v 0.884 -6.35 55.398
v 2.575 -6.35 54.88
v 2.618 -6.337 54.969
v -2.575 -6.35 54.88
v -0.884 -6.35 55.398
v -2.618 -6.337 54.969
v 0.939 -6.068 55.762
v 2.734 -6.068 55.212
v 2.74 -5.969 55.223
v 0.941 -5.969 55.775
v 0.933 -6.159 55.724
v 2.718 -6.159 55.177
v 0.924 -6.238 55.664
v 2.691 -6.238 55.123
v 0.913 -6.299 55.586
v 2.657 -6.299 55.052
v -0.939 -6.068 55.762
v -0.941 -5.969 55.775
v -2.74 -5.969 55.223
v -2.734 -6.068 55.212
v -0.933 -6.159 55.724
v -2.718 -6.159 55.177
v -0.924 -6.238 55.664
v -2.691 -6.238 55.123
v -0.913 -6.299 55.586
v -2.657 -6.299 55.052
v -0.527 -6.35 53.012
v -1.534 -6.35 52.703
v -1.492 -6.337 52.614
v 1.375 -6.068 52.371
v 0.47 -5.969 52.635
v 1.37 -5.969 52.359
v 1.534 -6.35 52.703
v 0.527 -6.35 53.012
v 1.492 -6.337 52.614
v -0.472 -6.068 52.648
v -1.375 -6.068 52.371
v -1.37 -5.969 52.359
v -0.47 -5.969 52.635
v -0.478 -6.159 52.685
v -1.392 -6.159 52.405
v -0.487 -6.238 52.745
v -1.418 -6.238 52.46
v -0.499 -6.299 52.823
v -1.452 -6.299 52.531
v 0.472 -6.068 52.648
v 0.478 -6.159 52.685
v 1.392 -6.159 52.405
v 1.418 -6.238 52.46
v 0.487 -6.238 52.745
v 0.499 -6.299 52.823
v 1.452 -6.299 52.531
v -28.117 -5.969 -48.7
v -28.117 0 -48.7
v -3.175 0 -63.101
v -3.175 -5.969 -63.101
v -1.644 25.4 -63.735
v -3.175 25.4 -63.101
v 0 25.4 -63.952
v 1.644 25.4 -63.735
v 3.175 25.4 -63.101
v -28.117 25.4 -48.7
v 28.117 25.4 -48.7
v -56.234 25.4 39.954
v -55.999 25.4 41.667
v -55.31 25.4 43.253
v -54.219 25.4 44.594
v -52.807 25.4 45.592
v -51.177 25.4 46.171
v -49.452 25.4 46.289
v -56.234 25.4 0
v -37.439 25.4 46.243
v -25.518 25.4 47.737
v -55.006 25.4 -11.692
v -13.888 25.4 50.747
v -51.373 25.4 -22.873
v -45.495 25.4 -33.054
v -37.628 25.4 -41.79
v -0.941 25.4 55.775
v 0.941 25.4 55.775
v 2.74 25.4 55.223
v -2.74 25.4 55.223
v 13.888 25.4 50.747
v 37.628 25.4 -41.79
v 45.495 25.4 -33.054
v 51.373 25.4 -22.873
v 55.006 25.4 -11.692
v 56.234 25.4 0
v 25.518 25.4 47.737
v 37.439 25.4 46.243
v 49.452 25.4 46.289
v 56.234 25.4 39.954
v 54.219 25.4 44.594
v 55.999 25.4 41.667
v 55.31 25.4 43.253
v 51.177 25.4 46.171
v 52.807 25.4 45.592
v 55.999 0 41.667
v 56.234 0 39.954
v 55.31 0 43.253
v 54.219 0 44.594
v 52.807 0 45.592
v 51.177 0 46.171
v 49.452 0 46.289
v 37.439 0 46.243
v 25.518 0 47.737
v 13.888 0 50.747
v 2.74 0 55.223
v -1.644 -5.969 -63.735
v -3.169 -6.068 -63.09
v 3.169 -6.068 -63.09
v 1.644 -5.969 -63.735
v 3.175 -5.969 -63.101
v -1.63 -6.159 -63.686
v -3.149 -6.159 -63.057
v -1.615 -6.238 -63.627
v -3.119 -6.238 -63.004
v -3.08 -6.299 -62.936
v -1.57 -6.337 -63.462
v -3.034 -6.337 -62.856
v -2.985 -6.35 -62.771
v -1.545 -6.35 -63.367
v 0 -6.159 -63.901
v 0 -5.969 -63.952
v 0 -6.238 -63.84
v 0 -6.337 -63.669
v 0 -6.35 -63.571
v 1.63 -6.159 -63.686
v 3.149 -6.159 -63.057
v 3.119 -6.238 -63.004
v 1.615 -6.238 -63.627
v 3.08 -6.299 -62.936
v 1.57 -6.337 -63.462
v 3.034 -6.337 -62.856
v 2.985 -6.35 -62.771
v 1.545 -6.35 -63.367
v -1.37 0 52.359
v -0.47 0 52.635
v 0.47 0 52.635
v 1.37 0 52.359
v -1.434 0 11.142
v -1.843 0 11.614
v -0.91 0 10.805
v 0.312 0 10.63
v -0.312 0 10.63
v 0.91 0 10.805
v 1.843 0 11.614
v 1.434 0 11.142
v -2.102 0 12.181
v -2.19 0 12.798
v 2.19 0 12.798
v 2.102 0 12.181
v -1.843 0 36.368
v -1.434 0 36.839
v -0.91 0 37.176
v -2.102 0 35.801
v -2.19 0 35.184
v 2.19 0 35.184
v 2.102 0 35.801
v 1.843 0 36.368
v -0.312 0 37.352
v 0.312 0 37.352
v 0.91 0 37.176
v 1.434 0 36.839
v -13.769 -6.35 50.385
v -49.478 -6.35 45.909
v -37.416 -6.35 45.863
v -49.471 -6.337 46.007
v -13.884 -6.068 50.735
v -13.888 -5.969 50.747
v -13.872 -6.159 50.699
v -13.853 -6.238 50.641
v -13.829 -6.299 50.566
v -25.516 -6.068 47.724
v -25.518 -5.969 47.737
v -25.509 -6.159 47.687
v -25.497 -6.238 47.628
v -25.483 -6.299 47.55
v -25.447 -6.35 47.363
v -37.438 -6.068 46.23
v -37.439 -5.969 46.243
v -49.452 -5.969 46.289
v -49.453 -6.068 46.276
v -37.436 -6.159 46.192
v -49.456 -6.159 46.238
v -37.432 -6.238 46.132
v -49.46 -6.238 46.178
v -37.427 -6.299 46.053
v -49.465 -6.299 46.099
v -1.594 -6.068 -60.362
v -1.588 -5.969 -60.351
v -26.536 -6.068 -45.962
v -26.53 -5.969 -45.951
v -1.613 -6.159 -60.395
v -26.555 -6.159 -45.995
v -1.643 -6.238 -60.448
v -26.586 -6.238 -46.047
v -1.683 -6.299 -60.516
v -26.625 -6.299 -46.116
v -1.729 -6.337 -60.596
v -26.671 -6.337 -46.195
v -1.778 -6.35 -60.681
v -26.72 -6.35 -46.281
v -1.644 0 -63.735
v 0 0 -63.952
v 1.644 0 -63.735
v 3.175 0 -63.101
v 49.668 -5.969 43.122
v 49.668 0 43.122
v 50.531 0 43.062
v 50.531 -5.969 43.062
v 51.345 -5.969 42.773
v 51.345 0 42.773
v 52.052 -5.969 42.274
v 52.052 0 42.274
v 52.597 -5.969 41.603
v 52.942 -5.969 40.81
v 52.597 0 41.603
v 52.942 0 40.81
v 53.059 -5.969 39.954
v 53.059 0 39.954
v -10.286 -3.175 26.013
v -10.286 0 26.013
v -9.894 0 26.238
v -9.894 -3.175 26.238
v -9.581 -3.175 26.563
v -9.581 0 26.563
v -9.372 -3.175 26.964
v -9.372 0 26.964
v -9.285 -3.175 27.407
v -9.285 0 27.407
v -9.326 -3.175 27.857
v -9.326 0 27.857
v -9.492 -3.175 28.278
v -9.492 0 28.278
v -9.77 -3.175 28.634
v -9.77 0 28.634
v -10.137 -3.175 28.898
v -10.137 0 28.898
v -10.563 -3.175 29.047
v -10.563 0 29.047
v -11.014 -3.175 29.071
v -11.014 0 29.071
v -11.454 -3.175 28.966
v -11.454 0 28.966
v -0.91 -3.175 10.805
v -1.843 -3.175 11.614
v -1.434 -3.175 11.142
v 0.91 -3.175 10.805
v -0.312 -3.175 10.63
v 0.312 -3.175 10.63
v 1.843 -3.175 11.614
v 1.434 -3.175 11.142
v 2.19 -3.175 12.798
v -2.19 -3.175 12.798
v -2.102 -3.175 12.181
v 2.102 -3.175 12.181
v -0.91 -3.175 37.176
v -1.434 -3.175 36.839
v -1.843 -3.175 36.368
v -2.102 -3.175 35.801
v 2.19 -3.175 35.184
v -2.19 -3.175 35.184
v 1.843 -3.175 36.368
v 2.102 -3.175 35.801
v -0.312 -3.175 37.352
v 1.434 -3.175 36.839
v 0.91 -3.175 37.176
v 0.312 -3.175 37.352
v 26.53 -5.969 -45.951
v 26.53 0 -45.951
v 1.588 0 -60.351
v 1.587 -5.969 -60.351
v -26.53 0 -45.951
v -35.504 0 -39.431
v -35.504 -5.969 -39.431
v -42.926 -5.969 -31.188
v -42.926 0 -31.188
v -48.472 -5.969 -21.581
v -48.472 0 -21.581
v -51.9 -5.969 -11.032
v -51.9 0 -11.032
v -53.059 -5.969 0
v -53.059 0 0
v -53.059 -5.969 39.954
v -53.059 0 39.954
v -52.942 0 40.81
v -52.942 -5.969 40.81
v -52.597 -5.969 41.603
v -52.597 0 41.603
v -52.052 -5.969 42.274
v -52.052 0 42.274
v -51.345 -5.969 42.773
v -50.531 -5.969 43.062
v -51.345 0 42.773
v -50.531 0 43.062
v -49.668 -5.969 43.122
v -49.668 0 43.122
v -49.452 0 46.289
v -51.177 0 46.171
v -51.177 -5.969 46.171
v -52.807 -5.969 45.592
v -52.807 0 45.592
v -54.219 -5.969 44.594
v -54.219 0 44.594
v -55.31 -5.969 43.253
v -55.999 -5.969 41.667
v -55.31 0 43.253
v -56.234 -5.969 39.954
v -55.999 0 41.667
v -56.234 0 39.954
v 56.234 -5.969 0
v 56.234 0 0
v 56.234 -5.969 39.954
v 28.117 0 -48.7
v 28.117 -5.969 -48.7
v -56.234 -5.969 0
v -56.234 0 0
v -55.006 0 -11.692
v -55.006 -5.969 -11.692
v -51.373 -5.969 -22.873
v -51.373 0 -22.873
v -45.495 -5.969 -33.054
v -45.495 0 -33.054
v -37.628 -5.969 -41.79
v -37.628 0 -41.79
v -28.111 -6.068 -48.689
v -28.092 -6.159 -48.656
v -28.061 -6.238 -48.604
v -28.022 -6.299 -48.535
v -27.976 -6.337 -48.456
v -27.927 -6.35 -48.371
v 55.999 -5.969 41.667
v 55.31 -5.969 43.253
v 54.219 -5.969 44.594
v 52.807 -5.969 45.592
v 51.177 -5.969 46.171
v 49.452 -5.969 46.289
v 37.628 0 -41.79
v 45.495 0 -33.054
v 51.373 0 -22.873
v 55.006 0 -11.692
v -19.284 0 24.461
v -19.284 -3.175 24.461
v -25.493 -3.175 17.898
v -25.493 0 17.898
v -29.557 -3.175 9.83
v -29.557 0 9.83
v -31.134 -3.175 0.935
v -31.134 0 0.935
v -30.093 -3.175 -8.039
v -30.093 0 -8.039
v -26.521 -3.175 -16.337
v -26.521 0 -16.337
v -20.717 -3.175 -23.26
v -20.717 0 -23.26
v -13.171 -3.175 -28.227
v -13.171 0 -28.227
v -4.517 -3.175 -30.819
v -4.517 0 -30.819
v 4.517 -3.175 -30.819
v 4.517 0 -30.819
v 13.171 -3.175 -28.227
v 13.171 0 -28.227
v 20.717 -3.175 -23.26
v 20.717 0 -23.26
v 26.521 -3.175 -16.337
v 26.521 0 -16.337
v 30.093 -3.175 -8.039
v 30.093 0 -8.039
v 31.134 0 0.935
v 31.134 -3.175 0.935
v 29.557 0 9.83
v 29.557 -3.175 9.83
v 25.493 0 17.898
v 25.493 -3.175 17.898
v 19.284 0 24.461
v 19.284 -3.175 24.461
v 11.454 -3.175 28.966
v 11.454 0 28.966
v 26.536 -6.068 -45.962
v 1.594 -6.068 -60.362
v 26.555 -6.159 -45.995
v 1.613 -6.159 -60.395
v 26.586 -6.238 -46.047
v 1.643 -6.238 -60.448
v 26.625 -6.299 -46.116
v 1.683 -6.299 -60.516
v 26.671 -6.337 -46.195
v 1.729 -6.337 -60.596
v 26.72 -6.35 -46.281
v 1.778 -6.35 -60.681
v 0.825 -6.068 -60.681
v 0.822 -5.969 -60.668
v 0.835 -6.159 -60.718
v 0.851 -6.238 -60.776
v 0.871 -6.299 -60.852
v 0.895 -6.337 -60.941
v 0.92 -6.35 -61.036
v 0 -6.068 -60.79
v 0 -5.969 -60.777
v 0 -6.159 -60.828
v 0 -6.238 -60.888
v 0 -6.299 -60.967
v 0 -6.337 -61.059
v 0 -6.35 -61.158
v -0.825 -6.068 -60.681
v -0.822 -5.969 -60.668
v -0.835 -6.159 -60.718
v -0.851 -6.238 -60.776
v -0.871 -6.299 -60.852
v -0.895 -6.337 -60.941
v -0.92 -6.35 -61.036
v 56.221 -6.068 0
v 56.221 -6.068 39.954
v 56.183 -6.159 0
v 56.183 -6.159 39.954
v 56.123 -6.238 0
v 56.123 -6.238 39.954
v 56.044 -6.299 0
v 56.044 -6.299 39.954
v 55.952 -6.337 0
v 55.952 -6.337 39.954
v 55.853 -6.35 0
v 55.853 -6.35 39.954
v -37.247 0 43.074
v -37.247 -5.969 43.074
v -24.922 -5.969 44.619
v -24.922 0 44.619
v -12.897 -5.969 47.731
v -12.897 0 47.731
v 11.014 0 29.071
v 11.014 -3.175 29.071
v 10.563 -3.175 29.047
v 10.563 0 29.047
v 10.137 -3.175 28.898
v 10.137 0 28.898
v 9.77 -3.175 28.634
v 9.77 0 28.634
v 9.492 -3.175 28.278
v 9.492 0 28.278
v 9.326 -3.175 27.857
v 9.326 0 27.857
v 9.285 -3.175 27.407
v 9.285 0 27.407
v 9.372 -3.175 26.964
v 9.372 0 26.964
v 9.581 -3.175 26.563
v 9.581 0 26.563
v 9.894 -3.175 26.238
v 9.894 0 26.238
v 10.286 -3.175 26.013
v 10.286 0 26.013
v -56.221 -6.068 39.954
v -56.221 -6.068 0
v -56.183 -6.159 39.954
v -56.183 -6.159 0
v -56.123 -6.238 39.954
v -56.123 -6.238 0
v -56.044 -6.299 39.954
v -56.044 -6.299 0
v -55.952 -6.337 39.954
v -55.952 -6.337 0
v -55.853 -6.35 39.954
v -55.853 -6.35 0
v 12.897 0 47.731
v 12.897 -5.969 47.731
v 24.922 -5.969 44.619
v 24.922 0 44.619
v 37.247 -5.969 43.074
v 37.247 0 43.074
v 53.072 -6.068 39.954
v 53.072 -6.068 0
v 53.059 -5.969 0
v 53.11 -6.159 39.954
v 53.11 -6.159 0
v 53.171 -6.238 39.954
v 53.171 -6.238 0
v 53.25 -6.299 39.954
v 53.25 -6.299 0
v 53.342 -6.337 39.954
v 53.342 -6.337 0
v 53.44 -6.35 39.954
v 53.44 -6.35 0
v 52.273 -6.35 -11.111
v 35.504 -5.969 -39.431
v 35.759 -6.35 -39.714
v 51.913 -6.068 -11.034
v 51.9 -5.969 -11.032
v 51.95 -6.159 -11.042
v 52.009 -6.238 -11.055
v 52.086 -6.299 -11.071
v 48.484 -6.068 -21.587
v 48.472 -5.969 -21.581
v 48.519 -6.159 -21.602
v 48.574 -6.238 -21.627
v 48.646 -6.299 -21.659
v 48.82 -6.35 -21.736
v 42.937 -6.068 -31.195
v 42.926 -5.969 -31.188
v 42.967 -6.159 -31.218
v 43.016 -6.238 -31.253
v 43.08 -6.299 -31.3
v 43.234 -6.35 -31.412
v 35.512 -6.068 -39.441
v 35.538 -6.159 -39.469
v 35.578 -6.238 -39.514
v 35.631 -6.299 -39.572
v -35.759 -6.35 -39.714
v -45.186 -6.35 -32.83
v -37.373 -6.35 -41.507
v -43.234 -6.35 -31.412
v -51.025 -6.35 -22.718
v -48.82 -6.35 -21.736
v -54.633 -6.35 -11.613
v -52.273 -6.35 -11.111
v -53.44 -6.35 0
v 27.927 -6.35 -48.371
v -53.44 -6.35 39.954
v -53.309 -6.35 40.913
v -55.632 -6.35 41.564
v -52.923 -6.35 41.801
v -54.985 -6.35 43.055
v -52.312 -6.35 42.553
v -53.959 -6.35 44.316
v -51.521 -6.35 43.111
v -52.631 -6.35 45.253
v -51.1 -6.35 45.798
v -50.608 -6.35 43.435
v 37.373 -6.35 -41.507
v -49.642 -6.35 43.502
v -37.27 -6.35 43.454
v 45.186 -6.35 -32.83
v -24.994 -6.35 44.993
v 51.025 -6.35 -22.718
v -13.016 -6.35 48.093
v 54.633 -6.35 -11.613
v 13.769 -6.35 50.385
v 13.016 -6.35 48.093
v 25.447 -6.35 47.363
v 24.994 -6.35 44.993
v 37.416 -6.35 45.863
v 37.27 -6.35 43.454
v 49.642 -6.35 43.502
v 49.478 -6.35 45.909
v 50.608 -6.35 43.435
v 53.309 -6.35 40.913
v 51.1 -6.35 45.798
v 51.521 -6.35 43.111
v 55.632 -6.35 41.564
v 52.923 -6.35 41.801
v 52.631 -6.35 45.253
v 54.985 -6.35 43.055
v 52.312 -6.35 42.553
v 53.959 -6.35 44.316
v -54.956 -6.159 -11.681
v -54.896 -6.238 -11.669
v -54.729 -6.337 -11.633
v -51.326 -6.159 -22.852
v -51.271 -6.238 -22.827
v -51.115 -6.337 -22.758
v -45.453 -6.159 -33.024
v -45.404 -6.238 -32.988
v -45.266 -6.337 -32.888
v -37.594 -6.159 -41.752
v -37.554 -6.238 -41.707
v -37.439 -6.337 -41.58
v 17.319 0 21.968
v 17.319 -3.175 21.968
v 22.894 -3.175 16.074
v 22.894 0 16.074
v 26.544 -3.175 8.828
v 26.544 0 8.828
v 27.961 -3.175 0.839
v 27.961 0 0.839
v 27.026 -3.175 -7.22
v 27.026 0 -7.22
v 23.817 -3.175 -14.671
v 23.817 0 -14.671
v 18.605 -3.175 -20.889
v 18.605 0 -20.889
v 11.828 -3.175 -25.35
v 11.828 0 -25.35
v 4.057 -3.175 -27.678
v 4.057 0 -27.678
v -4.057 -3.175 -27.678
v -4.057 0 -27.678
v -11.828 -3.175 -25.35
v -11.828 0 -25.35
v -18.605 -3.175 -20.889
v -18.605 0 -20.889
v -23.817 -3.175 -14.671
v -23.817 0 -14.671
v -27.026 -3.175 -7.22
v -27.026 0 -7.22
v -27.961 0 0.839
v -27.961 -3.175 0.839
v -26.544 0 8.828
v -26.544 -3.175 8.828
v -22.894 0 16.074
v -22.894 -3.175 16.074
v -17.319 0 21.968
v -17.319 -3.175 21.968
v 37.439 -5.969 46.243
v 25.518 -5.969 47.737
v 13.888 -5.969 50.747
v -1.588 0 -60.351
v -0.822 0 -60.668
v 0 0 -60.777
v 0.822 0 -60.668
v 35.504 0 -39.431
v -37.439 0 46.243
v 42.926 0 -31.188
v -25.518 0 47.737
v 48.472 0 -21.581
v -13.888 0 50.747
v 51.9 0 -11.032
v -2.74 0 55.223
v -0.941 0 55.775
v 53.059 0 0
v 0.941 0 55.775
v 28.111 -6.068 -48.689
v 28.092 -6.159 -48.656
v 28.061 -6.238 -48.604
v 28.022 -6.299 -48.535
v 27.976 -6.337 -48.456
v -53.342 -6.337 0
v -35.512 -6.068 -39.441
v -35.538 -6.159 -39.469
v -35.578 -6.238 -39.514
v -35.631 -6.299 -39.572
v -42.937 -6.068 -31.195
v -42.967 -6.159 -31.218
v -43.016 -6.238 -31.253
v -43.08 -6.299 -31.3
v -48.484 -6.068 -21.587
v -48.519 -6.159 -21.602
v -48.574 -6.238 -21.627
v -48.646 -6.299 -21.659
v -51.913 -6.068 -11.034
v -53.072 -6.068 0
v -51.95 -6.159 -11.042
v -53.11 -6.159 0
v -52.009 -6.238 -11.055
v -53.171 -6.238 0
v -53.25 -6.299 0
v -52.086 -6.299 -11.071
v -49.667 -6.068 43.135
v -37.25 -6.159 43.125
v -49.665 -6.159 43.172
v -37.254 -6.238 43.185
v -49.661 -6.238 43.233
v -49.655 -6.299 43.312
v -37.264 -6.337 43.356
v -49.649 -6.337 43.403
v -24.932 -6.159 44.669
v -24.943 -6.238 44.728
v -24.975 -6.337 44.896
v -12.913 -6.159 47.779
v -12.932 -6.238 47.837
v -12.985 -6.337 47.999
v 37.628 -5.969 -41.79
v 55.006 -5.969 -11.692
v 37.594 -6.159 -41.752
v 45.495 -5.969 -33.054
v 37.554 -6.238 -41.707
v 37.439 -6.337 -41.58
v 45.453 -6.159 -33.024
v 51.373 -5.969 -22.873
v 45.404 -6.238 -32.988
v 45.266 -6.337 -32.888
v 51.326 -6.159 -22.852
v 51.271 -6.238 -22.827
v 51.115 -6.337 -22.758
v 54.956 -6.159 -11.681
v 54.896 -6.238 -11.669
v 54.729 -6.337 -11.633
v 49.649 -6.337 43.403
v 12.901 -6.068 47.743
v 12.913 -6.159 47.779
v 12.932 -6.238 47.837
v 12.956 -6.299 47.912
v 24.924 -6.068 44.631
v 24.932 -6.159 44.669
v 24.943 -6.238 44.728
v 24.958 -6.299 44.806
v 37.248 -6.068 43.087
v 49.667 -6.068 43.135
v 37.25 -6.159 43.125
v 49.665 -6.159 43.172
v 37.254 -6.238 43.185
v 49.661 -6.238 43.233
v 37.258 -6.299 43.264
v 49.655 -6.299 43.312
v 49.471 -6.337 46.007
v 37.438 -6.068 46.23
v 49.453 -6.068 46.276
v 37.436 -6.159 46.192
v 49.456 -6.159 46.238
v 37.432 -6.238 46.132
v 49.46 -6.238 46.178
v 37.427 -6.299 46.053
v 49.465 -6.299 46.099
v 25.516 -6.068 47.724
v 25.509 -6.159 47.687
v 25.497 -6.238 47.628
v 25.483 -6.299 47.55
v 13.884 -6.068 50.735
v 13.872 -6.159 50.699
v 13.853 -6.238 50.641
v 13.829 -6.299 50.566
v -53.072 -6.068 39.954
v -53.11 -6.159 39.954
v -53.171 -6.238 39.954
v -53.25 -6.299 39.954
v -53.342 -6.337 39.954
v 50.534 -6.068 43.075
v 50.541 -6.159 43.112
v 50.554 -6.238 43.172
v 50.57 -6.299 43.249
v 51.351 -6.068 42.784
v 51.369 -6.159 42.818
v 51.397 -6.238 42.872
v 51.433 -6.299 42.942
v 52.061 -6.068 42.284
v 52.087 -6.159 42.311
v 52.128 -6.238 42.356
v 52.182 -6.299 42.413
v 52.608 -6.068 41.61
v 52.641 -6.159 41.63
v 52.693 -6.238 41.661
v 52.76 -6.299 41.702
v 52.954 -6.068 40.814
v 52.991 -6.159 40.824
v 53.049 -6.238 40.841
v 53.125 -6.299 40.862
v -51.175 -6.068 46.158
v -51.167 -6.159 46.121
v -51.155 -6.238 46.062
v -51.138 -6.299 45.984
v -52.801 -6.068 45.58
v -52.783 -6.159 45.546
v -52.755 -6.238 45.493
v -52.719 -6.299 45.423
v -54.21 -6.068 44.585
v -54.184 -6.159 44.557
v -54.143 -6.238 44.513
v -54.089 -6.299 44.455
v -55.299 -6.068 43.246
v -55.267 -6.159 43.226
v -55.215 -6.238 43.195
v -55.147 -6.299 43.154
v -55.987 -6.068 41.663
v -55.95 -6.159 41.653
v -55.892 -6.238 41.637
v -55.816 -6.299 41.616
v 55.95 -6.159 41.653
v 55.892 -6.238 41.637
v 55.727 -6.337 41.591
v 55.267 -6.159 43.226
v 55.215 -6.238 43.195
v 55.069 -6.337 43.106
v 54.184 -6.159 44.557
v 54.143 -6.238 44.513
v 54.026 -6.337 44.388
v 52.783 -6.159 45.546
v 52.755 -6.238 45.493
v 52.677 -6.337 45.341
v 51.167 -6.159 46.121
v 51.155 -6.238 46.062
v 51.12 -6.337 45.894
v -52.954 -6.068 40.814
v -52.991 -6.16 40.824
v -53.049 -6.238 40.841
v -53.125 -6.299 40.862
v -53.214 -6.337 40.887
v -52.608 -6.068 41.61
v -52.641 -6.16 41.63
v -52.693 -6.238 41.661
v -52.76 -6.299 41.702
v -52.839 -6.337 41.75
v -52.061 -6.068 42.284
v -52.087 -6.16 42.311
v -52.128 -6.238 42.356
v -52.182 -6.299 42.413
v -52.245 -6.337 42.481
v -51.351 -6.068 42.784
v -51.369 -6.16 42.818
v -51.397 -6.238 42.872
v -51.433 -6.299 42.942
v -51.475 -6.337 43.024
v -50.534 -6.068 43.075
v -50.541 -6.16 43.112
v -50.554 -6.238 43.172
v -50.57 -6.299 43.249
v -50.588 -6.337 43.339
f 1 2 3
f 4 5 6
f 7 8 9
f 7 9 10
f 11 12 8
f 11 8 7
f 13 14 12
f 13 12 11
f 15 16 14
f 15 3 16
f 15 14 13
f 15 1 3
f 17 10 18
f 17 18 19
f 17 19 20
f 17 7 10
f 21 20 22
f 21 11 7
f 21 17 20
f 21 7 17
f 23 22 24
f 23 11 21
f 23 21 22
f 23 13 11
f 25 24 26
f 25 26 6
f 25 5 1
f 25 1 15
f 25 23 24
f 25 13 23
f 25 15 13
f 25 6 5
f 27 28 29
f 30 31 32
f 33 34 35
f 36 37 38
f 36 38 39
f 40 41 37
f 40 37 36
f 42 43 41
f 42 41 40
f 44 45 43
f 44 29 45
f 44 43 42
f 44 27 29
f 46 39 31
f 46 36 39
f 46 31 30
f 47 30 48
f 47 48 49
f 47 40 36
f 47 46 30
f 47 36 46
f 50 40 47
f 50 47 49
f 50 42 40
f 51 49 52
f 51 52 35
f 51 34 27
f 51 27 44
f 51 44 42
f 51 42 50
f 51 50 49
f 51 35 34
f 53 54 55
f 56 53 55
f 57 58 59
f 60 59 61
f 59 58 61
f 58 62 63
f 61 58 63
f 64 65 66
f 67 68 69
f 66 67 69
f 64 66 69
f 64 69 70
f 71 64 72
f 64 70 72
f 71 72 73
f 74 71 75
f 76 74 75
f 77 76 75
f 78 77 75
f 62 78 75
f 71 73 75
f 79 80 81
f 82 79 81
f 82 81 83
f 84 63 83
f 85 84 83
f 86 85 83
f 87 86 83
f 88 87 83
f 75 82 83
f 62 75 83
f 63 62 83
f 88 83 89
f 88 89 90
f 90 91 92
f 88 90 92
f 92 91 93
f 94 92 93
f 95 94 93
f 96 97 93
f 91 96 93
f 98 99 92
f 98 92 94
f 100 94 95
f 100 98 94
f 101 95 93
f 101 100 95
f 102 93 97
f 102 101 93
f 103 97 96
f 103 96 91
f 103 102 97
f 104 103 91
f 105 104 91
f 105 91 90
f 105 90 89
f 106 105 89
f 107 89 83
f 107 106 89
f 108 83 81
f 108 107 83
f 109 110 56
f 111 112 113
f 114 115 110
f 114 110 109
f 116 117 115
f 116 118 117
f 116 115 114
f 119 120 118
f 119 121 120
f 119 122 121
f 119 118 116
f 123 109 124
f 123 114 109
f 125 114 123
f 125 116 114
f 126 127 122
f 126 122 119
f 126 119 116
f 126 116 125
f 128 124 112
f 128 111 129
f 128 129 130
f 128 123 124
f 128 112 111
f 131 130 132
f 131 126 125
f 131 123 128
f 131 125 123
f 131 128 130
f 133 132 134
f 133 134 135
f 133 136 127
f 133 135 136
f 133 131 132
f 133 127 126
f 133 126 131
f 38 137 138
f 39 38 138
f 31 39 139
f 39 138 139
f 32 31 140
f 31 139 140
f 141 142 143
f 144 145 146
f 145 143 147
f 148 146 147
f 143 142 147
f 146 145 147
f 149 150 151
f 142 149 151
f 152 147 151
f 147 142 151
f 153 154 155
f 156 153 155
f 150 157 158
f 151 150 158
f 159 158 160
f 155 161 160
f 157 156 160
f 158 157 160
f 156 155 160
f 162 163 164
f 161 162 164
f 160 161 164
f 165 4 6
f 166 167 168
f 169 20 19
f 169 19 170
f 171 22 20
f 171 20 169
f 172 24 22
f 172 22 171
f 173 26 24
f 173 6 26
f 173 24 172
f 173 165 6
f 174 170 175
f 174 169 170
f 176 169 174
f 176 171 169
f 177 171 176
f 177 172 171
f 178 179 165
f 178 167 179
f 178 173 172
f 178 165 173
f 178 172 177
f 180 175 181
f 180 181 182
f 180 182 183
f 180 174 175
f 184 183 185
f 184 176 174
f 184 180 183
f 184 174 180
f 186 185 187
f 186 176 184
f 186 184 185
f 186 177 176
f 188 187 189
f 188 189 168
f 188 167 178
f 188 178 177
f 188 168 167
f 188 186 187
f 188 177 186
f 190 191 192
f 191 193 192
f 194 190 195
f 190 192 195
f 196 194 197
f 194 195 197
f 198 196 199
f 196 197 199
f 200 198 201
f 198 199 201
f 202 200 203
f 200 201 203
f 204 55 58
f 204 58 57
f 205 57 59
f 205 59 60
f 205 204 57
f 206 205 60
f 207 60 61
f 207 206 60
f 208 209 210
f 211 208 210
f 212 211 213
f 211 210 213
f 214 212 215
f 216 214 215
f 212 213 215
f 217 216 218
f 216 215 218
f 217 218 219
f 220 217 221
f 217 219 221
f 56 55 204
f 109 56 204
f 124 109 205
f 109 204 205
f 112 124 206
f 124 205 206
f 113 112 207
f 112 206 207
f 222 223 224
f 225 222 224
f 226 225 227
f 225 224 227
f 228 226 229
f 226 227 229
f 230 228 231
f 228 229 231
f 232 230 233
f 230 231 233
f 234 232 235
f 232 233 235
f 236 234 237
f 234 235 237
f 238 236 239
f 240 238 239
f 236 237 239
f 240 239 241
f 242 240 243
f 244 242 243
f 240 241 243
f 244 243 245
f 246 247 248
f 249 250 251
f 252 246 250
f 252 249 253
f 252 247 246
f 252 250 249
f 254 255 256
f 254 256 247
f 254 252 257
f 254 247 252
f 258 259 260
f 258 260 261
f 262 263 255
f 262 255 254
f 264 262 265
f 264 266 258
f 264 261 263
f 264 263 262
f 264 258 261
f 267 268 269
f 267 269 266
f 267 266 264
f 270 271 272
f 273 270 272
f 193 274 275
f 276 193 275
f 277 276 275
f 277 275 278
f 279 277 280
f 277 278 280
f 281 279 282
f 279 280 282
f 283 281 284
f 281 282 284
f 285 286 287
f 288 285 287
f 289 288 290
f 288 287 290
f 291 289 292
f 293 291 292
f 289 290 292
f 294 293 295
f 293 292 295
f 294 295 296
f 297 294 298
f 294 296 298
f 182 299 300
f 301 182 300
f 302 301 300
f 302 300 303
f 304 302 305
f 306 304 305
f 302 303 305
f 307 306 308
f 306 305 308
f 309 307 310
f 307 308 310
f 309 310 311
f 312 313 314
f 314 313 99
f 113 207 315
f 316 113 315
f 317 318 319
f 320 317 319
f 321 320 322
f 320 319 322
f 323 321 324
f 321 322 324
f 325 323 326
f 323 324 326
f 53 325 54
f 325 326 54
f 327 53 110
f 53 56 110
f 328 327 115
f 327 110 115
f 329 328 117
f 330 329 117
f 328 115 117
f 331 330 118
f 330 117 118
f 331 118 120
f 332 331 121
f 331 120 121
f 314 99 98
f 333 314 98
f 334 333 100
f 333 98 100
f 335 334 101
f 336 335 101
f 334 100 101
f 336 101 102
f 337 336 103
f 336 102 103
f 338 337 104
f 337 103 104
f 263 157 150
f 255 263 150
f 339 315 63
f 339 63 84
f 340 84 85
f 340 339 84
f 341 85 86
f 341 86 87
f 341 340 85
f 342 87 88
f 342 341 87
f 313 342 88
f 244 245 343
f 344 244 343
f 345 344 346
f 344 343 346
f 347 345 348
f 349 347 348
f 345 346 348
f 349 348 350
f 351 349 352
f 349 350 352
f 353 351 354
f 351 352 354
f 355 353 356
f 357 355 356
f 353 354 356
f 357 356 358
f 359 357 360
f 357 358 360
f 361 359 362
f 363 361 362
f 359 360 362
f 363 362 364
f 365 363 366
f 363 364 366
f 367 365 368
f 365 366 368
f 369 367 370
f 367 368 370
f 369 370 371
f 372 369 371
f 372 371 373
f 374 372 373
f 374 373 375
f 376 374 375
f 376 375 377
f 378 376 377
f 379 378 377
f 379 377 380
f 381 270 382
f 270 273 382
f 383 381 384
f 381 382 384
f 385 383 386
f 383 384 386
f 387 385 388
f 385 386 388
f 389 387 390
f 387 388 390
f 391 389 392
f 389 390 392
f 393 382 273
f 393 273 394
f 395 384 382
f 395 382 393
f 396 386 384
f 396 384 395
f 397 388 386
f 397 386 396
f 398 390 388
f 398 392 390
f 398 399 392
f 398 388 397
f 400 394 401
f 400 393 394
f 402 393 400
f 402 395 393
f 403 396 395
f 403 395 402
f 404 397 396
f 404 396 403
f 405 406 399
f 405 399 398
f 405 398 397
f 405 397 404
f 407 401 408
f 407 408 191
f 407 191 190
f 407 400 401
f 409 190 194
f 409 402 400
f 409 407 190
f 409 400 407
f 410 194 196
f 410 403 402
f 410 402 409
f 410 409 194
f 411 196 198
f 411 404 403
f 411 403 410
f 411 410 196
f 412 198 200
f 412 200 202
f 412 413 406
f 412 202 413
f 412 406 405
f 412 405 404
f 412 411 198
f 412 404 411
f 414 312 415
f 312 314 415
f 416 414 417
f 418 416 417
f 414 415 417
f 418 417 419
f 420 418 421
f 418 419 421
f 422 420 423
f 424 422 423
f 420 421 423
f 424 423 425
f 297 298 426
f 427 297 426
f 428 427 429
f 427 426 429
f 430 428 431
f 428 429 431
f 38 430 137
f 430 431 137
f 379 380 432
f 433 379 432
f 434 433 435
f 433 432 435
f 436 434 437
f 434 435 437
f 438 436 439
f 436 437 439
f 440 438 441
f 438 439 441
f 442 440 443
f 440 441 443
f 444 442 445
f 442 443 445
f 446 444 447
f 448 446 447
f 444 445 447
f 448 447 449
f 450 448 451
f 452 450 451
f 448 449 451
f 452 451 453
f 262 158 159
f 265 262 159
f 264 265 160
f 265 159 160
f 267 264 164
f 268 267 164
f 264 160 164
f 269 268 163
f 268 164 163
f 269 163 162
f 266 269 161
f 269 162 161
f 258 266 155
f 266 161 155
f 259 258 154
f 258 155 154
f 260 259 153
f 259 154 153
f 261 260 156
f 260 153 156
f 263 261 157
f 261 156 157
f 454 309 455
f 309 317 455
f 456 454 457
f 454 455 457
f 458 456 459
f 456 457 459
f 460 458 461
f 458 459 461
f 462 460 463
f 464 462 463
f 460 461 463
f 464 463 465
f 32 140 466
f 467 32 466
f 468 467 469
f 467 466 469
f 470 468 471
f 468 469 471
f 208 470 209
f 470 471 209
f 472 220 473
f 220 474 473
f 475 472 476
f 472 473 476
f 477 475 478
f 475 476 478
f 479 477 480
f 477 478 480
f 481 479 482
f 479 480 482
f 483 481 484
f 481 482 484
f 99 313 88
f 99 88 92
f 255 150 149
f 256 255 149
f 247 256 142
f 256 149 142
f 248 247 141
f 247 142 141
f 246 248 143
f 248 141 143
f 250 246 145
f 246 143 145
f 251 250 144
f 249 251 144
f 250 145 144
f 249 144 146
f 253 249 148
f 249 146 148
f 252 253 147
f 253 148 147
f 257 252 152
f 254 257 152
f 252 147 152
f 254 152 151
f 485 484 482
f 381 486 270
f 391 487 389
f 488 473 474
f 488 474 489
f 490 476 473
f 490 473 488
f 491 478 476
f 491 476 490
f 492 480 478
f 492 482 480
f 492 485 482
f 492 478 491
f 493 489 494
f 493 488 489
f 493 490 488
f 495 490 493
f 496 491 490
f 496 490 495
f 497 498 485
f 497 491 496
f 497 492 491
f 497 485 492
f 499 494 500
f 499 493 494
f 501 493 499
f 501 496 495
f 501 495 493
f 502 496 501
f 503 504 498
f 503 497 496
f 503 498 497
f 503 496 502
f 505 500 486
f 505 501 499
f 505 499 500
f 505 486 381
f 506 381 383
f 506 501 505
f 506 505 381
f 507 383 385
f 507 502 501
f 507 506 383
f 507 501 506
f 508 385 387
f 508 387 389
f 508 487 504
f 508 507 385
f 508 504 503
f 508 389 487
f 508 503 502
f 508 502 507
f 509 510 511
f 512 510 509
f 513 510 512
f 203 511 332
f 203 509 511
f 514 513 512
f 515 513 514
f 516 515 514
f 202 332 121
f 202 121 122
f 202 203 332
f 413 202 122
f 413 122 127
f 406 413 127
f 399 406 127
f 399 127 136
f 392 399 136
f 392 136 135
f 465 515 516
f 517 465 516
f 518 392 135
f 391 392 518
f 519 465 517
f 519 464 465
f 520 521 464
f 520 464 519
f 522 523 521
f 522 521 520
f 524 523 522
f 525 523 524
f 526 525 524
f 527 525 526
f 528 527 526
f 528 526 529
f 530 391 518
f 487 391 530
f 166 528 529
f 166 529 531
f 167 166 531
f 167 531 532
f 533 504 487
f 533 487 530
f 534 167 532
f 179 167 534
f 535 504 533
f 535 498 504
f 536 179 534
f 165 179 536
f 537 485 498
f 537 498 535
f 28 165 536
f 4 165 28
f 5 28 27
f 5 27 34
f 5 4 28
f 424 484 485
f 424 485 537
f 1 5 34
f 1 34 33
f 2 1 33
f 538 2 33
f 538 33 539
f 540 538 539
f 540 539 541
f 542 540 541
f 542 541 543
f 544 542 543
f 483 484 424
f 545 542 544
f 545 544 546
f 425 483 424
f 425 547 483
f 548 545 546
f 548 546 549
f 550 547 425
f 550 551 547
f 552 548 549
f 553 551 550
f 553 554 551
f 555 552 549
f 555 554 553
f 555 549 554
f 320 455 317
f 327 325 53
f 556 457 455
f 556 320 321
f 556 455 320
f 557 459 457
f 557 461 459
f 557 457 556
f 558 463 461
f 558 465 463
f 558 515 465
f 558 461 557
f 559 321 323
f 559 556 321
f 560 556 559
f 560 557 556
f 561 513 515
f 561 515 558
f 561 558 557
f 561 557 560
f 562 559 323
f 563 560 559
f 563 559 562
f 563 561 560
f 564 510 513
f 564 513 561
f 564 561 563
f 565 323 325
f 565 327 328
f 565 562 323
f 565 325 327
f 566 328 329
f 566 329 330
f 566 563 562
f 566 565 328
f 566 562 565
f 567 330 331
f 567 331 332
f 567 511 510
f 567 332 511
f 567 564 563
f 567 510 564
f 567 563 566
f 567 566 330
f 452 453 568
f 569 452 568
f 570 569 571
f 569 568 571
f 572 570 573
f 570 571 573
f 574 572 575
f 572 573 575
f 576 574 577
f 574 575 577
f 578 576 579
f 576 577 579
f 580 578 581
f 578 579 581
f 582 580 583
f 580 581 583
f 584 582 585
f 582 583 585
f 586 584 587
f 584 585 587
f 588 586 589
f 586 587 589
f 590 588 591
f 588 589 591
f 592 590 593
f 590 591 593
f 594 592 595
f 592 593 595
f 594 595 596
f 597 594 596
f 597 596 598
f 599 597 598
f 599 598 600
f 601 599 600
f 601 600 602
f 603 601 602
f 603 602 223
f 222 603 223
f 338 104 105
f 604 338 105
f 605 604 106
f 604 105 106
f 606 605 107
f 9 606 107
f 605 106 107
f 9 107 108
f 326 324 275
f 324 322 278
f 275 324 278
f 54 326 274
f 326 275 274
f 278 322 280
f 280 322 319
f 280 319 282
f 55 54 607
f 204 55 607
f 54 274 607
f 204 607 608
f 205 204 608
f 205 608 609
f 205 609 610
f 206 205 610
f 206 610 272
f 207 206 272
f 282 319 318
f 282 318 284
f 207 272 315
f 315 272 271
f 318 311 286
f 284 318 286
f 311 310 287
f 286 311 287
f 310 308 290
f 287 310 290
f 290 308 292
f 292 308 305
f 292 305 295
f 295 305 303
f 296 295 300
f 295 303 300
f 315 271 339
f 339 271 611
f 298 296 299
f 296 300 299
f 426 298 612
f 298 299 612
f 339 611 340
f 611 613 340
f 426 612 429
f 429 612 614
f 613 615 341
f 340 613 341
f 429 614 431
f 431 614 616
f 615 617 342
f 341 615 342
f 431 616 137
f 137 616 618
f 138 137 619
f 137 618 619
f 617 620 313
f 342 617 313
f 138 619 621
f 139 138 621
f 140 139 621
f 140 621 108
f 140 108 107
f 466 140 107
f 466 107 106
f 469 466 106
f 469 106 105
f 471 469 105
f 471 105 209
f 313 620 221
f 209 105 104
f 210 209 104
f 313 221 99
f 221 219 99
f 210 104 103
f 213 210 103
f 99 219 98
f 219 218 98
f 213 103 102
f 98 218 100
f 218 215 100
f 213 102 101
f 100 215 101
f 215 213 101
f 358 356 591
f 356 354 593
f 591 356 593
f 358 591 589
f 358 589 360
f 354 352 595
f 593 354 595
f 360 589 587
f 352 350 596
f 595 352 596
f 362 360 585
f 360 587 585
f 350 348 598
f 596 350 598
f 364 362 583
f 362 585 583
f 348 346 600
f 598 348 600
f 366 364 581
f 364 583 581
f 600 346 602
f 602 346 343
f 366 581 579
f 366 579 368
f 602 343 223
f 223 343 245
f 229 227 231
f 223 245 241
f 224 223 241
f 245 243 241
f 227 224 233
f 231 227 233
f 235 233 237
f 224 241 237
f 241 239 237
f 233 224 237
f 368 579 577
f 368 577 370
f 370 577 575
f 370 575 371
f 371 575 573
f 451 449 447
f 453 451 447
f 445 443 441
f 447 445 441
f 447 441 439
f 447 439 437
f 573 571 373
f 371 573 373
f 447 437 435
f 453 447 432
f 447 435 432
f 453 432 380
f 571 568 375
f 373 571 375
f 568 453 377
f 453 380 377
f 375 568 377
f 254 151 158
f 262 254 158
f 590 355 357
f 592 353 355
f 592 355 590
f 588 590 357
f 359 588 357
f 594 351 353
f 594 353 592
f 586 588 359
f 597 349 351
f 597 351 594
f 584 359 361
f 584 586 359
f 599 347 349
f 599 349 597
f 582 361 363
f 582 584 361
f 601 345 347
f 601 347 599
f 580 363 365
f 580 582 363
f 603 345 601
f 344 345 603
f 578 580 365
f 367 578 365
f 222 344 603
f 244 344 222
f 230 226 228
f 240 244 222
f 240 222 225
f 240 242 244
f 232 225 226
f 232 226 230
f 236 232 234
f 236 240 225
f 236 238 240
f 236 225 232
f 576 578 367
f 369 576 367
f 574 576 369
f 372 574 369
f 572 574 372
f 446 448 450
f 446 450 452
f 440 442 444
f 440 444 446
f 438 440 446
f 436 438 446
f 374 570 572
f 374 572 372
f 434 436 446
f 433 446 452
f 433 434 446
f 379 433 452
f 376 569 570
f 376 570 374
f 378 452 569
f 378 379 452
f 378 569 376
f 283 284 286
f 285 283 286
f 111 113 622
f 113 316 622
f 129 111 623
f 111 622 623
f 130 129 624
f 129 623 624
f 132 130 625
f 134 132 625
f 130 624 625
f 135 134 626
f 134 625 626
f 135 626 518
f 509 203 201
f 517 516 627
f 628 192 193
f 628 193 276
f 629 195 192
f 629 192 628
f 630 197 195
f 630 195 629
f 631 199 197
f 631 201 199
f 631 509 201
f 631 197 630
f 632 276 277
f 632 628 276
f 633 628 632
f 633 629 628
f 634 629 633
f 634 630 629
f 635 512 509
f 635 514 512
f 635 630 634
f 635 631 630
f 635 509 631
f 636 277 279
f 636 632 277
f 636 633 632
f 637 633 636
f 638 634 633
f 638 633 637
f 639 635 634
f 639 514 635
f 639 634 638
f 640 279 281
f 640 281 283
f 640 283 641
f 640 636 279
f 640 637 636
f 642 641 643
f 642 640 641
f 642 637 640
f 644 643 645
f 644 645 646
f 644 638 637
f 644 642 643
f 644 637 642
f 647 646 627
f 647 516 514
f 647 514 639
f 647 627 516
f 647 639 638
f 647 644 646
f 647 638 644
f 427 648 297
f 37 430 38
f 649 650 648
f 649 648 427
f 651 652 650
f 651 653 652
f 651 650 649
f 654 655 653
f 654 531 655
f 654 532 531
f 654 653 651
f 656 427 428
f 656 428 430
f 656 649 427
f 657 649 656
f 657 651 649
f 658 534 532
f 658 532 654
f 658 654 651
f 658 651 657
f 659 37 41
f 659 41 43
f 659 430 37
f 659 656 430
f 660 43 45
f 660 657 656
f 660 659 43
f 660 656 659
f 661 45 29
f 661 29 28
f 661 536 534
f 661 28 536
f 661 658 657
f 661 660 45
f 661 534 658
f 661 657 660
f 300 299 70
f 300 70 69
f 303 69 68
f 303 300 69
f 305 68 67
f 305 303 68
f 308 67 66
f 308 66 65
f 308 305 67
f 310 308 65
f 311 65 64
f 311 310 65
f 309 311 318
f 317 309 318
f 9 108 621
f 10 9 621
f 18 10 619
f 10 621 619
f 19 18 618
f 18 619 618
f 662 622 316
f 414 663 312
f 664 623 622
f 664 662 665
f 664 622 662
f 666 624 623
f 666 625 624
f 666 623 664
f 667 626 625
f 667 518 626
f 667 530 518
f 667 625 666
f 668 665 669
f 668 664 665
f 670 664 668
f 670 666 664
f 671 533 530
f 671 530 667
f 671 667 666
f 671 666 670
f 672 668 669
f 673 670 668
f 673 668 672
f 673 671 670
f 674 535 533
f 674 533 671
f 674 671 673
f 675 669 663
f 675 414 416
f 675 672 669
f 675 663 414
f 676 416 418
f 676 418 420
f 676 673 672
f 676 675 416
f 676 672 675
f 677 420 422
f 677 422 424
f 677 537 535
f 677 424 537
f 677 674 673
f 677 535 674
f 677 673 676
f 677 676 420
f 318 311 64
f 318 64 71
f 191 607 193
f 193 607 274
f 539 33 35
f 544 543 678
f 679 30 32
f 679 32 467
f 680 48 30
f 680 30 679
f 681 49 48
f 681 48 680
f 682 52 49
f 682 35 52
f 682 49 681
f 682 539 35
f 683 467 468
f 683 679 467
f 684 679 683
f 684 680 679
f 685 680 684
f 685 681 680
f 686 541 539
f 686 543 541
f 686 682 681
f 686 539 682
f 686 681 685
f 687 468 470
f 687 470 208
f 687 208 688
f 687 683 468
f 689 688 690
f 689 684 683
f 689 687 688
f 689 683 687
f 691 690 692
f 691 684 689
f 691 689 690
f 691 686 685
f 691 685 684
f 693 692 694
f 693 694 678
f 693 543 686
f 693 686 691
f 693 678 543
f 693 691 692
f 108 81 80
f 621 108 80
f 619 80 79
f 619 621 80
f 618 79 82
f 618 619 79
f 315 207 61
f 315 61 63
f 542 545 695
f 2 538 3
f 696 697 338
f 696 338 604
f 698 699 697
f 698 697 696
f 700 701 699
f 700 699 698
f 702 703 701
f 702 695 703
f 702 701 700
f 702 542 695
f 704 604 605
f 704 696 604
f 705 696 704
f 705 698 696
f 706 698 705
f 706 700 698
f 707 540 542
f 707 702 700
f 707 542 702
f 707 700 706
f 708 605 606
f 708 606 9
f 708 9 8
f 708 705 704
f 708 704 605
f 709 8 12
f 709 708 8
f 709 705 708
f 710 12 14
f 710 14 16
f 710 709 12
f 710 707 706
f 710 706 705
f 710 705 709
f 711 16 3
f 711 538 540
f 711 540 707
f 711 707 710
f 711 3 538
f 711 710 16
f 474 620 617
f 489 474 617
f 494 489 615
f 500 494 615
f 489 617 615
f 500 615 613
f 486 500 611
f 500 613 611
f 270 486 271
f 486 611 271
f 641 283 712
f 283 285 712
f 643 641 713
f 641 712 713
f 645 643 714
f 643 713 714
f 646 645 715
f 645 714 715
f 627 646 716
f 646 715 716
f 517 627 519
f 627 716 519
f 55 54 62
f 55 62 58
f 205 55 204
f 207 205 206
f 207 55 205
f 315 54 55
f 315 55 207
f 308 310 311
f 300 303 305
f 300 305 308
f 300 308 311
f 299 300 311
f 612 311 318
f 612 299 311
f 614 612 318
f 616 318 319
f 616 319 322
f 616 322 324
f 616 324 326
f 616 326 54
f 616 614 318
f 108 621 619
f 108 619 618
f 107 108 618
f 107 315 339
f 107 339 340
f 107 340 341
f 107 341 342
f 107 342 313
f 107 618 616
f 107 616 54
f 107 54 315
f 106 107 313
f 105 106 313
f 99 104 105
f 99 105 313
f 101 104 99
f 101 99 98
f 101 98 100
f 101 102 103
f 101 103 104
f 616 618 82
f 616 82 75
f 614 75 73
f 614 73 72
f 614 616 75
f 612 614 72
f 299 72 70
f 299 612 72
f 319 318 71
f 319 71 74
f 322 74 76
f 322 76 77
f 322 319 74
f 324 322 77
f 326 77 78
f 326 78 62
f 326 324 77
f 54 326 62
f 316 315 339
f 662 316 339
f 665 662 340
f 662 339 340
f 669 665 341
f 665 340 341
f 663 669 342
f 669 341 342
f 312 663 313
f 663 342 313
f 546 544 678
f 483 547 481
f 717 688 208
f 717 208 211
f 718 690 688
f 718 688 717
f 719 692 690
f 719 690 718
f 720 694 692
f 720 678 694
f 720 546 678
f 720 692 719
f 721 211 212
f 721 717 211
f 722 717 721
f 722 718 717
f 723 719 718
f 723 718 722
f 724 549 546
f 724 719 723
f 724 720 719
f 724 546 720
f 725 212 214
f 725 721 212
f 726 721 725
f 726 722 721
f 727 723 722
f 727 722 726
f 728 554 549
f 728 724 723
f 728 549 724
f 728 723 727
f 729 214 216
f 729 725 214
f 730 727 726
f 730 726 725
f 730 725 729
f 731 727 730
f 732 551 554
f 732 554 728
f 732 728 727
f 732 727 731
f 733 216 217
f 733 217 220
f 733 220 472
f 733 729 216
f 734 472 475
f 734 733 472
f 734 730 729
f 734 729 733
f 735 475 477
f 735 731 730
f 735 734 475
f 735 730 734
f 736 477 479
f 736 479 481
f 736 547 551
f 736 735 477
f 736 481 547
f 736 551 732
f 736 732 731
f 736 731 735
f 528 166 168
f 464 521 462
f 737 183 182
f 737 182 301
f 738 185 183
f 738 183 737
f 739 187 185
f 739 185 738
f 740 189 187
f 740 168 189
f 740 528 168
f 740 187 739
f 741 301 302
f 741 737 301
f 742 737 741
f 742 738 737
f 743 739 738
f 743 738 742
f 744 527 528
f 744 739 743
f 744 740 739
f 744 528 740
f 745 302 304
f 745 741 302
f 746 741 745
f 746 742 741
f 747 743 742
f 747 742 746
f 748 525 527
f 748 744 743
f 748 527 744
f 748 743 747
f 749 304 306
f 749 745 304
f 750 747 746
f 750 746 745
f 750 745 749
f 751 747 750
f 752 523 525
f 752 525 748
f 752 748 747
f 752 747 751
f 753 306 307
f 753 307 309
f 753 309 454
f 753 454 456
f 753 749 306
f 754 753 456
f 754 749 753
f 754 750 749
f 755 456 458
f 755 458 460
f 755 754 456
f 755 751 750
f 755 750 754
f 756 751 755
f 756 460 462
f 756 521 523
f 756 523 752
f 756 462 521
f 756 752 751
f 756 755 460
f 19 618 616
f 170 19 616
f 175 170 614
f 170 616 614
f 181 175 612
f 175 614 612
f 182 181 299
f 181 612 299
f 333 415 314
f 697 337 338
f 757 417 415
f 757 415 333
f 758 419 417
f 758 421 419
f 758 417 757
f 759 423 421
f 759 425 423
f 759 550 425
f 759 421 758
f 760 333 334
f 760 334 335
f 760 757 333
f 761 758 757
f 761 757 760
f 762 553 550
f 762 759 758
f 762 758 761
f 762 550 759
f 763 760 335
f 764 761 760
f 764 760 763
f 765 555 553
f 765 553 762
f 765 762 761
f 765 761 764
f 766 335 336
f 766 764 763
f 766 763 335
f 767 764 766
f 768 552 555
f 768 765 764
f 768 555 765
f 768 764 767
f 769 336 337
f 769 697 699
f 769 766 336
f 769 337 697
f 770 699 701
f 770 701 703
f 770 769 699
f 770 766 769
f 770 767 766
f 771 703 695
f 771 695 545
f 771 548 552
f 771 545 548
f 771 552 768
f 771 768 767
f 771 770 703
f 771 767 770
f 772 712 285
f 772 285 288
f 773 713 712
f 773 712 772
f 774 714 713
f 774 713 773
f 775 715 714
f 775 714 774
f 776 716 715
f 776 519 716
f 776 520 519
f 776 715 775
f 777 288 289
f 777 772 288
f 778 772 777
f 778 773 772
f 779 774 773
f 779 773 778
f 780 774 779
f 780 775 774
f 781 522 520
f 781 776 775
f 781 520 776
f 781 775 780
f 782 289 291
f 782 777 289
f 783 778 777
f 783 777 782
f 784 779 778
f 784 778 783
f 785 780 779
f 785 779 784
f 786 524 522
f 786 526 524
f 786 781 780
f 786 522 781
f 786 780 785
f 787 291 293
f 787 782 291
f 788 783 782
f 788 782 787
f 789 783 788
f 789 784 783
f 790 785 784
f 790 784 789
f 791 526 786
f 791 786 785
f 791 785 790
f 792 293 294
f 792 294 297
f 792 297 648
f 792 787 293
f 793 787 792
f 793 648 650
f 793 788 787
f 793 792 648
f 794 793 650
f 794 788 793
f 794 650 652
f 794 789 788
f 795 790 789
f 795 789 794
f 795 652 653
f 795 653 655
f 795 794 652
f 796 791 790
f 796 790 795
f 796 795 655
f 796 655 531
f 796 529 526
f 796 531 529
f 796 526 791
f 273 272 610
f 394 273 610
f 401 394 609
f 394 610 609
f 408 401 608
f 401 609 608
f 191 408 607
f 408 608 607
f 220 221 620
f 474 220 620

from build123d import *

# Parameters (mm, degrees)
F1_DEPTH = 25.4
F3_DEPTH = 6.35
F5_DEPTH = 3.175
F6_R     = 0.381


with BuildPart() as f1:
    # F0 (on Front) → F1 (new body)
    with BuildSketch(Plane.XZ):
        with BuildLine():
            ThreePointArc((-49.452183, 46.289197), (-54.219059, 44.59437), (-56.234455, 39.953927))
            Line((-56.234455, 39.953927), (-56.234455, 0))
            ThreePointArc((-56.234455, 0), (-48.700467, -28.117228), (-28.117228, -48.700467))
            Line((-28.117228, -48.700467), (-3.175, -63.100869))
            ThreePointArc((-3.175, -63.100869), (0, -63.951607), (3.175, -63.100869))
            Line((3.175, -63.100869), (28.117228, -48.700467))
            ThreePointArc((28.117228, -48.700467), (48.700467, -28.117228), (56.234455, 0))
            Line((56.234455, 0), (56.234455, 39.953927))
            ThreePointArc((56.234455, 39.953927), (54.219059, 44.59437), (49.452183, 46.289197))
            ThreePointArc((49.452183, 46.289197), (25.518453, 47.737164), (2.739611, 55.223445))
            ThreePointArc((2.739611, 55.223445), (0, 55.84483), (-2.739611, 55.223445))
            ThreePointArc((-2.739611, 55.223445), (-25.518453, 47.737164), (-49.452183, 46.289197))
        make_face()
    extrude(amount=-F1_DEPTH)


with BuildPart() as f3:
    # F2 (on face) → F3 (new body)
    with BuildSketch(Plane.XZ):
        with BuildLine():
            ThreePointArc((-2.739611, 55.223445), (-25.518453, 47.737164), (-49.452183, 46.289197))
            ThreePointArc((-49.452183, 46.289197), (-54.219059, 44.59437), (-56.234455, 39.953927))
            Line((-56.234455, 39.953927), (-56.234455, 0))
            ThreePointArc((-56.234455, 0), (-48.700467, -28.117228), (-28.117228, -48.700467))
            Line((-28.117228, -48.700467), (-3.175, -63.100869))
            ThreePointArc((-3.175, -63.100869), (0, -63.951607), (3.175, -63.100869))
            Line((3.175, -63.100869), (28.117228, -48.700467))
            ThreePointArc((28.117228, -48.700467), (48.700467, -28.117228), (56.234455, 0))
            Line((56.234455, 0), (56.234455, 39.953927))
            ThreePointArc((56.234455, 39.953927), (54.219059, 44.59437), (49.452183, 46.289197))
            ThreePointArc((49.452183, 46.289197), (25.518453, 47.737164), (2.739611, 55.223445))
            ThreePointArc((2.739611, 55.223445), (0, 55.84483), (-2.739611, 55.223445))
        make_face()
        with BuildLine():
            ThreePointArc((-53.059455, 39.953927), (-52.051757, 42.274149), (-49.668319, 43.121562))
            ThreePointArc((-49.668319, 43.121562), (-24.922013, 44.618689), (-1.369806, 52.359138))
            ThreePointArc((-1.369806, 52.359138), (0, 52.66983), (1.369806, 52.359138))
            ThreePointArc((1.369806, 52.359138), (24.922013, 44.618689), (49.668319, 43.121562))
            ThreePointArc((49.668319, 43.121562), (52.051757, 42.274149), (53.059455, 39.953927))
            Line((53.059455, 39.953927), (53.059455, 0))
            ThreePointArc((53.059455, 0), (45.950836, -26.529728), (26.529728, -45.950836))
            Line((26.529728, -45.950836), (1.5875, -60.351238))
            ThreePointArc((1.5875, -60.351238), (0, -60.776607), (-1.5875, -60.351238))
            Line((-1.5875, -60.351238), (-26.529728, -45.950836))
            ThreePointArc((-26.529728, -45.950836), (-45.950836, -26.529728), (-53.059455, 0))
            Line((-53.059455, 0), (-53.059455, 39.953927))
        make_face(mode=Mode.SUBTRACT)
    extrude(amount=F3_DEPTH)

    # F6
    f6_edges = [f3.edges().sort_by_distance(p)[0] for p in [
        (-25.518453, -6.35, 47.737164),
        (-54.219059, -6.35, 44.59437),
        (-56.234455, -6.35, 19.976963),
        (-24.922013, -6.35, 44.618689),
    ]]
    fillet(f6_edges, radius=F6_R)


with BuildPart() as f5:
    # F4 (on face) → F5 (new body)
    with BuildSketch(Plane.XZ):
        with BuildLine():
            ThreePointArc((10.286366, 26.013471), (0, -27.97338), (-10.286366, 26.013471))
            Line((-10.286366, 26.013471), (-11.453876, 28.96602))
            ThreePointArc((-11.453876, 28.96602), (0, -31.14838), (11.453876, 28.96602))
            Line((11.453876, 28.96602), (10.286366, 26.013471))
        make_face()
        with BuildLine():
            Line((-11.453876, 28.96602), (-10.286366, 26.013471))
            ThreePointArc((-10.286366, 26.013471), (-9.393846, 28.073501), (-11.453876, 28.96602))
        make_face()
        with BuildLine():
            ThreePointArc((2.190431, 35.183746), (0, 32.993316), (-2.190431, 35.183746))
            Line((-2.190431, 35.183746), (-2.190431, 12.797762))
            ThreePointArc((-2.190431, 12.797762), (0, 14.988192), (2.190431, 12.797762))
            Line((2.190431, 12.797762), (2.190431, 35.183746))
        make_face()
        with BuildLine():
            ThreePointArc((2.190431, 35.183746), (0, 37.374177), (-2.190431, 35.183746))
            ThreePointArc((-2.190431, 35.183746), (0, 32.993316), (2.190431, 35.183746))
        make_face()
        with BuildLine():
            ThreePointArc((11.453876, 28.96602), (9.393846, 28.073501), (10.286366, 26.013471))
            Line((10.286366, 26.013471), (11.453876, 28.96602))
        make_face()
        with BuildLine():
            ThreePointArc((2.190431, 12.797762), (0, 14.988192), (-2.190431, 12.797762))
            ThreePointArc((-2.190431, 12.797762), (0, 10.607331), (2.190431, 12.797762))
        make_face()
    extrude(amount=F5_DEPTH)


solid = Compound([f1.part, f3.part, f5.part])
